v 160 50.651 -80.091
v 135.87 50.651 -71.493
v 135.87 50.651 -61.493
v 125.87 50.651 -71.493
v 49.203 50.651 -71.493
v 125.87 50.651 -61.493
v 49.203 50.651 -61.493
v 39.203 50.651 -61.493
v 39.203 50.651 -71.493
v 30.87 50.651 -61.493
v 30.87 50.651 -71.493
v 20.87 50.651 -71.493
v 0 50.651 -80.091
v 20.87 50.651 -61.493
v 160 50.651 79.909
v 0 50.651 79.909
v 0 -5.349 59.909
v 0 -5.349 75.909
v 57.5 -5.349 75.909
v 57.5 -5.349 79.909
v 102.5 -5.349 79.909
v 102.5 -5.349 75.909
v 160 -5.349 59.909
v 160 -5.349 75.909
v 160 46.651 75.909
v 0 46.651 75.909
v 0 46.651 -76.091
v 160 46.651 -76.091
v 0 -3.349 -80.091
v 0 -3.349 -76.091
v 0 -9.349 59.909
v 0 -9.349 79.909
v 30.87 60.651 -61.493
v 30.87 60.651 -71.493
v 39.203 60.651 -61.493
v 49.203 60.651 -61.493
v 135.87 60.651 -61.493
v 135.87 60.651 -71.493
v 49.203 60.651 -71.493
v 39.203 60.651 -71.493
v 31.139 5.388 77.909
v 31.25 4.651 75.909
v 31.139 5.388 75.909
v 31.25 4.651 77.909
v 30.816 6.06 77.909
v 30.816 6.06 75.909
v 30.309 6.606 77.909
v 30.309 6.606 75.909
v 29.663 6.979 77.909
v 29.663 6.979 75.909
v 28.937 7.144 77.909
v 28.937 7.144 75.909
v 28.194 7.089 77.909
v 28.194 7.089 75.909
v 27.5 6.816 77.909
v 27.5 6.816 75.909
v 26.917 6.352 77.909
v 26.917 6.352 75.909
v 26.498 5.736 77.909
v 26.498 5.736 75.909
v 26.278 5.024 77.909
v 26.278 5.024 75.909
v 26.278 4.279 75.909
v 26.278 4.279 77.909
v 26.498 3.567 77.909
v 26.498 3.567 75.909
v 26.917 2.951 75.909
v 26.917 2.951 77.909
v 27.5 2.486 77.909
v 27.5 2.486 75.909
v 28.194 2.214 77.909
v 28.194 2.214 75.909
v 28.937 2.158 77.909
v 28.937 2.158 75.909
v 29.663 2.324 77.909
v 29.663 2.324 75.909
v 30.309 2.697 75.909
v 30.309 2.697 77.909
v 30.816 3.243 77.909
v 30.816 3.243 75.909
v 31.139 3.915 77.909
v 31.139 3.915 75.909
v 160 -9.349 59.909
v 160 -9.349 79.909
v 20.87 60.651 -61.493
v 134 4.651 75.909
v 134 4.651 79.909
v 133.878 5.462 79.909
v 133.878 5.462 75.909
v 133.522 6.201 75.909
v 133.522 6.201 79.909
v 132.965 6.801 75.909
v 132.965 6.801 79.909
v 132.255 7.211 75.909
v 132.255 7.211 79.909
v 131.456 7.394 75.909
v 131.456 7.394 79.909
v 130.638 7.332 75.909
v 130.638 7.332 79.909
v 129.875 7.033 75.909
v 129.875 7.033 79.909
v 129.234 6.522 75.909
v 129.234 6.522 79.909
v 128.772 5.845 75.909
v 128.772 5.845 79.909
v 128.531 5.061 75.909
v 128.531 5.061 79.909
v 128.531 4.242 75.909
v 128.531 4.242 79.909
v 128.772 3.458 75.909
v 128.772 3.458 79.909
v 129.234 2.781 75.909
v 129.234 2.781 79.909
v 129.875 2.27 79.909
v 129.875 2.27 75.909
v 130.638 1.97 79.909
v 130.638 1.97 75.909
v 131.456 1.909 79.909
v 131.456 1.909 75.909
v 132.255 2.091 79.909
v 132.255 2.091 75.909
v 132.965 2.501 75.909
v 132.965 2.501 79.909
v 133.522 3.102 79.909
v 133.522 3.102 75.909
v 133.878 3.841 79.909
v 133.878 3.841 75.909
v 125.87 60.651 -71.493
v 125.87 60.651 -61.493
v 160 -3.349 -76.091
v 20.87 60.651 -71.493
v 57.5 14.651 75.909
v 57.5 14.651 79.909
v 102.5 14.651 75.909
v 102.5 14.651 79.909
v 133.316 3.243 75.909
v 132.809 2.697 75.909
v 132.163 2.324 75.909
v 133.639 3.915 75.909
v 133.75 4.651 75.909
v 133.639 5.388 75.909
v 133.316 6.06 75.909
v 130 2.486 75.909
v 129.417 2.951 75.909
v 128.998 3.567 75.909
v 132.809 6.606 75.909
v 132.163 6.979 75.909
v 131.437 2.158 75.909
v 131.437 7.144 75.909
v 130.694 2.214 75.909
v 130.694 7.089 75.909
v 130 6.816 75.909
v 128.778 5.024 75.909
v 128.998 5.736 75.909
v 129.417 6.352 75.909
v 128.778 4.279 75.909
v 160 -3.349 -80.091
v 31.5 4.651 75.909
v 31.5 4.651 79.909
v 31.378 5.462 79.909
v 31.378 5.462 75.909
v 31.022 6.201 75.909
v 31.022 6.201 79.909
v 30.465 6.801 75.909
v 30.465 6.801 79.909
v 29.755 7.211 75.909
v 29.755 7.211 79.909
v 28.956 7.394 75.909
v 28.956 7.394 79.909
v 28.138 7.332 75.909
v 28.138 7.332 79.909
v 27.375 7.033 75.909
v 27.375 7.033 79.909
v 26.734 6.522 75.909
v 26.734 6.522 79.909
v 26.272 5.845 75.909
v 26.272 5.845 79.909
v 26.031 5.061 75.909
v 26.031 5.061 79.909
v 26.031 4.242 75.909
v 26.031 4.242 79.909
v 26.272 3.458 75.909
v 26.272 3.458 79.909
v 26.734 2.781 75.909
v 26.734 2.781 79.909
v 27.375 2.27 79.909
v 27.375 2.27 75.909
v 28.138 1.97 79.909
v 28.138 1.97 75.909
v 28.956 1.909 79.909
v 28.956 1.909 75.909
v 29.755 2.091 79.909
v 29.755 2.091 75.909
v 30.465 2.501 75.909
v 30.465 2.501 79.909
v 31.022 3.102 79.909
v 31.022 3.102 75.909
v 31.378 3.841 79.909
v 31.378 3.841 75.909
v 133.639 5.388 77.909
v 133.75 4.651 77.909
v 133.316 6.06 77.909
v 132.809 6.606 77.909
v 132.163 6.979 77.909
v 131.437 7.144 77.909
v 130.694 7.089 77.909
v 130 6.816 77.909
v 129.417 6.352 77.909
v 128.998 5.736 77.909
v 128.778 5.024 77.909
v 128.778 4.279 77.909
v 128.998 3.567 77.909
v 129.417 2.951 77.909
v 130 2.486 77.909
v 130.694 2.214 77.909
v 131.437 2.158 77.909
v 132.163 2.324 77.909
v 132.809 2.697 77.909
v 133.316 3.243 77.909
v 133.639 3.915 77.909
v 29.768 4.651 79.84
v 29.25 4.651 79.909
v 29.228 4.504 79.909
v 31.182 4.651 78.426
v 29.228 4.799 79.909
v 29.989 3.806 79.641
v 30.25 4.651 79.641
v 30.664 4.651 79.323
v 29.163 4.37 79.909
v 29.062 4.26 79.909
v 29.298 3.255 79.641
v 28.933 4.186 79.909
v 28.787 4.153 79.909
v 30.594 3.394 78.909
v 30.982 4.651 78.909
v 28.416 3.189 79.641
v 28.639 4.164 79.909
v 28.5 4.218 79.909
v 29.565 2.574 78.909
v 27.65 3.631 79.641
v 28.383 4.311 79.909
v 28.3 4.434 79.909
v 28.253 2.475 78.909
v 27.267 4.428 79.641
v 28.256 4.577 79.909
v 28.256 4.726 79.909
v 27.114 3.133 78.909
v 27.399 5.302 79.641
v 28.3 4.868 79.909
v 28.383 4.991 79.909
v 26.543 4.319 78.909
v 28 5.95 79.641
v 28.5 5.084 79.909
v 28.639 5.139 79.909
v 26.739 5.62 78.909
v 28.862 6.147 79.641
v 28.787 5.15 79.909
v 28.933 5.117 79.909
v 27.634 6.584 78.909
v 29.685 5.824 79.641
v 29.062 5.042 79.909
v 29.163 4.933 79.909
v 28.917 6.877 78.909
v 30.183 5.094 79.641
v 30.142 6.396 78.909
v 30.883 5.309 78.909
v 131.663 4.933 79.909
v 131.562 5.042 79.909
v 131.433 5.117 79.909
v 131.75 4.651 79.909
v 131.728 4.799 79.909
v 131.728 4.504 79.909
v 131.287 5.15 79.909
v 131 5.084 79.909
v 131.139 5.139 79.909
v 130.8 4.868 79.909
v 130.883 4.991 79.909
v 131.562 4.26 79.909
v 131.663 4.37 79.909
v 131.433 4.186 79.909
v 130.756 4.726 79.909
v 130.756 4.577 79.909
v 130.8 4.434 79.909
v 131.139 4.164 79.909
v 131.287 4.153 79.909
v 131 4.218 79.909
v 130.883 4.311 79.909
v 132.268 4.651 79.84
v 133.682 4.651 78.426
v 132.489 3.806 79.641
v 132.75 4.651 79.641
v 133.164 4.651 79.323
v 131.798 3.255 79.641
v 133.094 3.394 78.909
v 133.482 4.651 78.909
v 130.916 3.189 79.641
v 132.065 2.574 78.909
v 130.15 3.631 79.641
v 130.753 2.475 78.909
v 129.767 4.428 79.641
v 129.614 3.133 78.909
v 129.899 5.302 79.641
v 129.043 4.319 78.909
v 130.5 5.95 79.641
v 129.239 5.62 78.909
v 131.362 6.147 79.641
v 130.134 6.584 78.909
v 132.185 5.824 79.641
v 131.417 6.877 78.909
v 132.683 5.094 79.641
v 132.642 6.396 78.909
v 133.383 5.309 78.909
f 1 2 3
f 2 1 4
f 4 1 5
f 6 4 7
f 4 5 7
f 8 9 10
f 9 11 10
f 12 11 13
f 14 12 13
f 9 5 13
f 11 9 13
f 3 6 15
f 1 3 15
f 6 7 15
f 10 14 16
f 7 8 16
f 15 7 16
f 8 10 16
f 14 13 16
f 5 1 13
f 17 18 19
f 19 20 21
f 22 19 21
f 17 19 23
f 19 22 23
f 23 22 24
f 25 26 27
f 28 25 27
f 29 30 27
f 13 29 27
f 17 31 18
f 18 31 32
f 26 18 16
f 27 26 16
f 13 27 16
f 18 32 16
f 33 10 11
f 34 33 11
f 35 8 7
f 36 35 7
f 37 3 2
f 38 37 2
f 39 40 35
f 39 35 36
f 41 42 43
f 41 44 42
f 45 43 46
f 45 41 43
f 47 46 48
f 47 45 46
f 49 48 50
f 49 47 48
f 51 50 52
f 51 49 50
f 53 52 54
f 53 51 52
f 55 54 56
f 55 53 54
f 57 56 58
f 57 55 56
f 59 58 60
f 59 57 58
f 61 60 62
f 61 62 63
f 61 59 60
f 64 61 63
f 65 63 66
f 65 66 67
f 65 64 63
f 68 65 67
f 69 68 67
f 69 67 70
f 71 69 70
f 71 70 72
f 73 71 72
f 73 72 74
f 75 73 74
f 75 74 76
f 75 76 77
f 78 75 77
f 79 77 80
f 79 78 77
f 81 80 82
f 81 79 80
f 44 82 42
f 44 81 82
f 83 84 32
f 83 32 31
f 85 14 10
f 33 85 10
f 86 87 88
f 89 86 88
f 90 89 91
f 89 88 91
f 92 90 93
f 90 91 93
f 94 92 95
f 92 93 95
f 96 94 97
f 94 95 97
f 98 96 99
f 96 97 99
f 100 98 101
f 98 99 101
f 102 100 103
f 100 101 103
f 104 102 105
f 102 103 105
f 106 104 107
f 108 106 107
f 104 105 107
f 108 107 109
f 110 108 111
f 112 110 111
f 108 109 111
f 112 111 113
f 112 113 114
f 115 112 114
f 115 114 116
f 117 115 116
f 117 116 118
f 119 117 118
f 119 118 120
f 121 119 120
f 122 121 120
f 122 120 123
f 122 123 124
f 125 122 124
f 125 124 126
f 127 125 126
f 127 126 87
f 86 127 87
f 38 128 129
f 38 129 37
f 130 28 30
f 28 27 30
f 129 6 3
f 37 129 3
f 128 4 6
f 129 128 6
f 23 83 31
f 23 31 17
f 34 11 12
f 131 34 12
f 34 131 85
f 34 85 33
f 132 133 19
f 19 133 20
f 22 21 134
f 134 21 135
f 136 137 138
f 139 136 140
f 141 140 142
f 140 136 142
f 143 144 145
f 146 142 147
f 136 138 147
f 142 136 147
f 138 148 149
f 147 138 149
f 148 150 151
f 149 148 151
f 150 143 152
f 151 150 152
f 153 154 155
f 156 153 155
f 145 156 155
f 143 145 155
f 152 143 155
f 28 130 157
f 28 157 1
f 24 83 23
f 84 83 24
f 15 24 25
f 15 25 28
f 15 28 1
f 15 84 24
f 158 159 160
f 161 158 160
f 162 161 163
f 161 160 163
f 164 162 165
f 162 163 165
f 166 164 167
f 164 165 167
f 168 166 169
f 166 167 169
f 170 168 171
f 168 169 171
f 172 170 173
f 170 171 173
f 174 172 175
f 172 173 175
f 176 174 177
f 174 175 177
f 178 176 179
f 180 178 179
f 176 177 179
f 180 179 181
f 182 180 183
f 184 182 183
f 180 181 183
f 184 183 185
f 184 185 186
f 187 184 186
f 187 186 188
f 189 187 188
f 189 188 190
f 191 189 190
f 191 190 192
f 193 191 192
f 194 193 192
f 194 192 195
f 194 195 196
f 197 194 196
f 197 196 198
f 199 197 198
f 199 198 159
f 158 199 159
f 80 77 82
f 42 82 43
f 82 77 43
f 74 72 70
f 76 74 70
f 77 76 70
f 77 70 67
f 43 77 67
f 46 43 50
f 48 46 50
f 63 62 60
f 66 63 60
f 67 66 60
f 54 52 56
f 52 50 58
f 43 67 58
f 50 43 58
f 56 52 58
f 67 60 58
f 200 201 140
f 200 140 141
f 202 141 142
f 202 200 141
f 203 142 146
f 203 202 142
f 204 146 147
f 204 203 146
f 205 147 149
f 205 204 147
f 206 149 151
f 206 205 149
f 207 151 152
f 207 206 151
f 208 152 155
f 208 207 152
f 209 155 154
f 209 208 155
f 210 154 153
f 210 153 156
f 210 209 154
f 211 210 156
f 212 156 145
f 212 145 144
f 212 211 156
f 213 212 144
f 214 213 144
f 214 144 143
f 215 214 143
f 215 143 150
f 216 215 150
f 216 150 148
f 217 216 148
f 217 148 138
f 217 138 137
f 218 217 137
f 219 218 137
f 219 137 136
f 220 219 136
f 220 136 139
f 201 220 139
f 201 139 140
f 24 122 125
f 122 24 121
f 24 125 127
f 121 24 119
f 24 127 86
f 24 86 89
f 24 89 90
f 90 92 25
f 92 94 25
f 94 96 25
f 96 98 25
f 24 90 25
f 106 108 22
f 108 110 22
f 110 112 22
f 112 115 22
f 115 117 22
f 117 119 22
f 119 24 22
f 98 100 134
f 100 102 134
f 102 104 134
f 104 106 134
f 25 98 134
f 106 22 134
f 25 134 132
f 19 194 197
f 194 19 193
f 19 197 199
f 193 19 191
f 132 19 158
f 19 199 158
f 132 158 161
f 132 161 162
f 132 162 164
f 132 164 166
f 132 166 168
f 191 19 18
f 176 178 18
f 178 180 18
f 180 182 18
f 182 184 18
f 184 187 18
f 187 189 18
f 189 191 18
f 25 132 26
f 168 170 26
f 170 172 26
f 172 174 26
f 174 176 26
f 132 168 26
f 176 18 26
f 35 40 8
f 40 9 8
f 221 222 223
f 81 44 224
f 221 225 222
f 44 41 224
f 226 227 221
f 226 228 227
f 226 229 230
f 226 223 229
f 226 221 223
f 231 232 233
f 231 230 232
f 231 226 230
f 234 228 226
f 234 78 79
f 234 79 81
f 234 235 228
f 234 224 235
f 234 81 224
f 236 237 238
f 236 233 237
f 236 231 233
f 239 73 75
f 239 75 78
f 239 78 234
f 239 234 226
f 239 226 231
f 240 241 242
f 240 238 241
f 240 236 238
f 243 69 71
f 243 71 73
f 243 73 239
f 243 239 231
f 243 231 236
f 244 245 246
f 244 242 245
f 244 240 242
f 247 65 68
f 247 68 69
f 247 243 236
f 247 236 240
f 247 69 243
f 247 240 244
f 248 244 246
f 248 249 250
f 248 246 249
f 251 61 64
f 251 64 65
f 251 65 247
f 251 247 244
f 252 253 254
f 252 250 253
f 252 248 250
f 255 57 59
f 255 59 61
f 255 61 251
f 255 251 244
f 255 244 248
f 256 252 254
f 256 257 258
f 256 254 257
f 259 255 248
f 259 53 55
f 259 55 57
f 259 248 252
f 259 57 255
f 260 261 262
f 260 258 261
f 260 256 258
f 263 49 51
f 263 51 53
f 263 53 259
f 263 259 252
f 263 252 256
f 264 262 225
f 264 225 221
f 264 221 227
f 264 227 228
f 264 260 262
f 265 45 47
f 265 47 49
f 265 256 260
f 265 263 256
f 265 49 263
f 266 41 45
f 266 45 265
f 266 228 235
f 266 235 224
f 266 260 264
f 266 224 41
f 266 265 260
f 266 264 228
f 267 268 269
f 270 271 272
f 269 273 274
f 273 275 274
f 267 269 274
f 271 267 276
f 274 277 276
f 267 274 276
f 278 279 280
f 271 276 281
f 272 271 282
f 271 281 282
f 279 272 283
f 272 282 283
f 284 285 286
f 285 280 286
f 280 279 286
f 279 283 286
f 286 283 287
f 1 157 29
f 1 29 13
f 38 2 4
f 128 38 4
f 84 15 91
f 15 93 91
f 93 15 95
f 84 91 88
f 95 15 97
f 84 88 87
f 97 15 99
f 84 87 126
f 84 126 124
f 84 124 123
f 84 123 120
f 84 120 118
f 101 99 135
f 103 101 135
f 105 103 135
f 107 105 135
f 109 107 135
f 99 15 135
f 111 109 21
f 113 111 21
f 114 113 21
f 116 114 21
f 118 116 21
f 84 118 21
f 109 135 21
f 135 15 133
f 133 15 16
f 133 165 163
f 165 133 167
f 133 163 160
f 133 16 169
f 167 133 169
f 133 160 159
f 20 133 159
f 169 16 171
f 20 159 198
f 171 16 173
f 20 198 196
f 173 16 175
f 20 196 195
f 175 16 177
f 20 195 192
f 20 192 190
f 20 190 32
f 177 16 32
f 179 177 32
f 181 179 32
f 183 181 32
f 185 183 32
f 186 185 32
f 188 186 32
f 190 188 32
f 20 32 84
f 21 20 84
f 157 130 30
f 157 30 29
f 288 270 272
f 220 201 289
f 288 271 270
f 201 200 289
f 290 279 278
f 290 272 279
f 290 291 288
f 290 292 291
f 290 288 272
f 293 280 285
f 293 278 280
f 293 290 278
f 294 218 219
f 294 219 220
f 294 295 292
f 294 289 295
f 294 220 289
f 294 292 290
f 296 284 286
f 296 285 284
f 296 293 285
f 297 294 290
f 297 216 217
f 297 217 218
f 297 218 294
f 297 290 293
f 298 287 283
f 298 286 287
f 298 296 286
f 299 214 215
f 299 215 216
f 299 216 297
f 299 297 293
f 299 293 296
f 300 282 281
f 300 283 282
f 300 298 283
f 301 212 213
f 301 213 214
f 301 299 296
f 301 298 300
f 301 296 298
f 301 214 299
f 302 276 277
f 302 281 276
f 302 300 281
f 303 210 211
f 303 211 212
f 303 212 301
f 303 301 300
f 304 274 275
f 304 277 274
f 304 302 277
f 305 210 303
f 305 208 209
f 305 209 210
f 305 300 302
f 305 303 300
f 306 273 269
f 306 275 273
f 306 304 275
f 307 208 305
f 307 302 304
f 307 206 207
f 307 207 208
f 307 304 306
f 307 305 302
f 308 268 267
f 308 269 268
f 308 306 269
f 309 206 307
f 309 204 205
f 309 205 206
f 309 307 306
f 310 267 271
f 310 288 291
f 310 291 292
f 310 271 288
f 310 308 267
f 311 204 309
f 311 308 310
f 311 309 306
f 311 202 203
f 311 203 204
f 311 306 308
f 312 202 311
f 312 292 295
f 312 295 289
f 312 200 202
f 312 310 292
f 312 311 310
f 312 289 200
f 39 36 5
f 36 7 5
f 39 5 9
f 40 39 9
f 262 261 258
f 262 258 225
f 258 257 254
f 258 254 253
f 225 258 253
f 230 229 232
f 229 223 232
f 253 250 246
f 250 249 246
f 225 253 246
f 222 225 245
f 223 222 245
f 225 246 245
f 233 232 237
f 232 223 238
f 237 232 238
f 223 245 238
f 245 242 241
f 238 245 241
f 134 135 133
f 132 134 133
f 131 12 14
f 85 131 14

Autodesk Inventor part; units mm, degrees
ref_plane "YZ Plane" through (0, 0, 0) normal (1, 0, 0) x (0, 1, 0)
ref_plane "XZ Plane" through (0, 0, 0) normal (0, 1, 0) x (-1, 0, 0)
ref_plane "XY Plane" through (0, 0, 0) normal (0, 0, 1) x (1, 0, 0)
sketch "Sketch1" plane through (0, 0, 0) normal (1, 0, 0) x (0, 1, 0)
  line L0 (50.6514, 79.9086) -> (-9.3486, 79.9086)
  line L1 (-3.3486, -80.0914) -> (50.6514, -80.0914)
  line L2 (50.6514, -80.0914) -> (50.6514, 79.9086)
  line L3 (-9.3486, 79.9086) -> (-9.3486, 59.9086)
  line L4 (-9.3486, 59.9086) -> (-5.3486, 59.9086)
  line L5 (-5.3486, 59.9086) -> (-5.3486, 75.9086)
  line L6 (-5.3486, 75.9086) -> (46.6514, 75.9086)
  line L7 (46.6514, 75.9086) -> (46.6514, -76.0914)
  line L8 (46.6514, -76.0914) -> (-3.3486, -76.0914)
  line L9 (-3.3486, -76.0914) -> (-3.3486, -80.0914)
  point P0 (0, 0)
  dimension "d0" = 160
  dimension "d1" = 54
  dimension "d2" = 60
  dimension "d3" = 20
  dimension "d4" = 4
  dimension "d5" = 4
  dimension "d6" = 4
  dimension "d7" = 4
  dimension "d8" = 4
  dimension "d9" = 4
extrude "Extrusion1" add sketch "Sketch1" along normal blind 160
sketch "Sketch2" plane through (0, -9.3486, 79.9086) normal (0, 0, 1) x (1, 0, 0)
  line L0 (57.5, 4) -> (102.5, 4)
  line L1 (102.5, 4) -> (102.5, 24)
  line L2 (102.5, 24) -> (57.5, 24)
  line L3 (57.5, 24) -> (57.5, 4)
  line L4 (57.5, 4) -> (102.5, 24) construction
  line L5 (102.5, 4) -> (57.5, 24) construction
  line L6 (0, 0) -> (160, 0) projected
  line L7 (160, 60) -> (160, 0) projected
  point P0 (0, 9.3486)
  point P1 (80, 14)
  dimension "d12" = 45
  dimension "d13" = 4
  dimension "d14" = 20
  dimension "d15" = 80
extrude "Extrusion2" cut sketch "Sketch2" against normal blind 5
sketch "Sketch3" plane through (0, -9.3486, 79.9086) normal (0, 0, 1) x (1, 0, 0)
  circle A0 centre (28.75, 14) radius 2.5
  circle A1 centre (131.25, 14) radius 2.5
  line L0 (0, 60) -> (0, 0) projected
  line L1 (57.5, 4) -> (57.5, 24) projected
  line L2 (160, 60) -> (160, 0) projected
  line L3 (102.5, 4) -> (57.5, 4) projected
  line L4 (57.5, 24) -> (102.5, 24) projected
  line L5 (0, 0) -> (160, 0) projected
  circle A2 centre (28.75, 14) radius 2.75
  circle A3 centre (131.25, 14) radius 2.75
  point P0 (0, 9.3486)
  dimension "d18" = 5
  dimension "d19" = 57.5
  dimension "d20" = 28.75
  dimension "d21" = 28.75
  dimension "d22" = 20
  dimension "d23" = 14
  dimension "d24" = 4
  dimension "d25" = 14
  dimension "d26" = 5.5
extrude "Extrusion3" cut sketch "Sketch3" against normal blind 5
fillet "Fillet1" radius 2 2 edges at (26.25, 4.6514, 79.9086) (128.75, 4.6514, 79.9086)
sketch "Sketch4" plane through (0, 50.6514, 79.9086) normal (0, 1, 0) x (1, 0, 0)
  line L0 (20.8697, 141.4018) -> (30.8697, 141.4018)
  line L1 (30.8697, 141.4018) -> (30.8697, 151.4018)
  line L2 (30.8697, 151.4018) -> (20.8697, 151.4018)
  line L3 (20.8697, 151.4018) -> (20.8697, 141.4018)
  line L4 (39.203, 141.4018) -> (49.203, 141.4018)
  line L5 (49.203, 141.4018) -> (49.203, 151.4018)
  line L6 (49.203, 151.4018) -> (39.203, 151.4018)
  line L7 (39.203, 151.4018) -> (39.203, 141.4018)
  line L8 (125.8697, 141.4018) -> (135.8697, 141.4018)
  line L9 (135.8697, 141.4018) -> (135.8697, 151.4018)
  line L10 (135.8697, 151.4018) -> (125.8697, 151.4018)
  line L11 (125.8697, 151.4018) -> (125.8697, 141.4018)
  point P0 (0, 79.9086)
  dimension "d32" = 10
  dimension "d33" = 10
  dimension "d34" = 10
  dimension "d35" = 10
  dimension "d36" = 10
  dimension "d37" = 10
extrude "Extrusion4" add sketch "Sketch4" along normal blind 10
properties part number "Top Plastic"
